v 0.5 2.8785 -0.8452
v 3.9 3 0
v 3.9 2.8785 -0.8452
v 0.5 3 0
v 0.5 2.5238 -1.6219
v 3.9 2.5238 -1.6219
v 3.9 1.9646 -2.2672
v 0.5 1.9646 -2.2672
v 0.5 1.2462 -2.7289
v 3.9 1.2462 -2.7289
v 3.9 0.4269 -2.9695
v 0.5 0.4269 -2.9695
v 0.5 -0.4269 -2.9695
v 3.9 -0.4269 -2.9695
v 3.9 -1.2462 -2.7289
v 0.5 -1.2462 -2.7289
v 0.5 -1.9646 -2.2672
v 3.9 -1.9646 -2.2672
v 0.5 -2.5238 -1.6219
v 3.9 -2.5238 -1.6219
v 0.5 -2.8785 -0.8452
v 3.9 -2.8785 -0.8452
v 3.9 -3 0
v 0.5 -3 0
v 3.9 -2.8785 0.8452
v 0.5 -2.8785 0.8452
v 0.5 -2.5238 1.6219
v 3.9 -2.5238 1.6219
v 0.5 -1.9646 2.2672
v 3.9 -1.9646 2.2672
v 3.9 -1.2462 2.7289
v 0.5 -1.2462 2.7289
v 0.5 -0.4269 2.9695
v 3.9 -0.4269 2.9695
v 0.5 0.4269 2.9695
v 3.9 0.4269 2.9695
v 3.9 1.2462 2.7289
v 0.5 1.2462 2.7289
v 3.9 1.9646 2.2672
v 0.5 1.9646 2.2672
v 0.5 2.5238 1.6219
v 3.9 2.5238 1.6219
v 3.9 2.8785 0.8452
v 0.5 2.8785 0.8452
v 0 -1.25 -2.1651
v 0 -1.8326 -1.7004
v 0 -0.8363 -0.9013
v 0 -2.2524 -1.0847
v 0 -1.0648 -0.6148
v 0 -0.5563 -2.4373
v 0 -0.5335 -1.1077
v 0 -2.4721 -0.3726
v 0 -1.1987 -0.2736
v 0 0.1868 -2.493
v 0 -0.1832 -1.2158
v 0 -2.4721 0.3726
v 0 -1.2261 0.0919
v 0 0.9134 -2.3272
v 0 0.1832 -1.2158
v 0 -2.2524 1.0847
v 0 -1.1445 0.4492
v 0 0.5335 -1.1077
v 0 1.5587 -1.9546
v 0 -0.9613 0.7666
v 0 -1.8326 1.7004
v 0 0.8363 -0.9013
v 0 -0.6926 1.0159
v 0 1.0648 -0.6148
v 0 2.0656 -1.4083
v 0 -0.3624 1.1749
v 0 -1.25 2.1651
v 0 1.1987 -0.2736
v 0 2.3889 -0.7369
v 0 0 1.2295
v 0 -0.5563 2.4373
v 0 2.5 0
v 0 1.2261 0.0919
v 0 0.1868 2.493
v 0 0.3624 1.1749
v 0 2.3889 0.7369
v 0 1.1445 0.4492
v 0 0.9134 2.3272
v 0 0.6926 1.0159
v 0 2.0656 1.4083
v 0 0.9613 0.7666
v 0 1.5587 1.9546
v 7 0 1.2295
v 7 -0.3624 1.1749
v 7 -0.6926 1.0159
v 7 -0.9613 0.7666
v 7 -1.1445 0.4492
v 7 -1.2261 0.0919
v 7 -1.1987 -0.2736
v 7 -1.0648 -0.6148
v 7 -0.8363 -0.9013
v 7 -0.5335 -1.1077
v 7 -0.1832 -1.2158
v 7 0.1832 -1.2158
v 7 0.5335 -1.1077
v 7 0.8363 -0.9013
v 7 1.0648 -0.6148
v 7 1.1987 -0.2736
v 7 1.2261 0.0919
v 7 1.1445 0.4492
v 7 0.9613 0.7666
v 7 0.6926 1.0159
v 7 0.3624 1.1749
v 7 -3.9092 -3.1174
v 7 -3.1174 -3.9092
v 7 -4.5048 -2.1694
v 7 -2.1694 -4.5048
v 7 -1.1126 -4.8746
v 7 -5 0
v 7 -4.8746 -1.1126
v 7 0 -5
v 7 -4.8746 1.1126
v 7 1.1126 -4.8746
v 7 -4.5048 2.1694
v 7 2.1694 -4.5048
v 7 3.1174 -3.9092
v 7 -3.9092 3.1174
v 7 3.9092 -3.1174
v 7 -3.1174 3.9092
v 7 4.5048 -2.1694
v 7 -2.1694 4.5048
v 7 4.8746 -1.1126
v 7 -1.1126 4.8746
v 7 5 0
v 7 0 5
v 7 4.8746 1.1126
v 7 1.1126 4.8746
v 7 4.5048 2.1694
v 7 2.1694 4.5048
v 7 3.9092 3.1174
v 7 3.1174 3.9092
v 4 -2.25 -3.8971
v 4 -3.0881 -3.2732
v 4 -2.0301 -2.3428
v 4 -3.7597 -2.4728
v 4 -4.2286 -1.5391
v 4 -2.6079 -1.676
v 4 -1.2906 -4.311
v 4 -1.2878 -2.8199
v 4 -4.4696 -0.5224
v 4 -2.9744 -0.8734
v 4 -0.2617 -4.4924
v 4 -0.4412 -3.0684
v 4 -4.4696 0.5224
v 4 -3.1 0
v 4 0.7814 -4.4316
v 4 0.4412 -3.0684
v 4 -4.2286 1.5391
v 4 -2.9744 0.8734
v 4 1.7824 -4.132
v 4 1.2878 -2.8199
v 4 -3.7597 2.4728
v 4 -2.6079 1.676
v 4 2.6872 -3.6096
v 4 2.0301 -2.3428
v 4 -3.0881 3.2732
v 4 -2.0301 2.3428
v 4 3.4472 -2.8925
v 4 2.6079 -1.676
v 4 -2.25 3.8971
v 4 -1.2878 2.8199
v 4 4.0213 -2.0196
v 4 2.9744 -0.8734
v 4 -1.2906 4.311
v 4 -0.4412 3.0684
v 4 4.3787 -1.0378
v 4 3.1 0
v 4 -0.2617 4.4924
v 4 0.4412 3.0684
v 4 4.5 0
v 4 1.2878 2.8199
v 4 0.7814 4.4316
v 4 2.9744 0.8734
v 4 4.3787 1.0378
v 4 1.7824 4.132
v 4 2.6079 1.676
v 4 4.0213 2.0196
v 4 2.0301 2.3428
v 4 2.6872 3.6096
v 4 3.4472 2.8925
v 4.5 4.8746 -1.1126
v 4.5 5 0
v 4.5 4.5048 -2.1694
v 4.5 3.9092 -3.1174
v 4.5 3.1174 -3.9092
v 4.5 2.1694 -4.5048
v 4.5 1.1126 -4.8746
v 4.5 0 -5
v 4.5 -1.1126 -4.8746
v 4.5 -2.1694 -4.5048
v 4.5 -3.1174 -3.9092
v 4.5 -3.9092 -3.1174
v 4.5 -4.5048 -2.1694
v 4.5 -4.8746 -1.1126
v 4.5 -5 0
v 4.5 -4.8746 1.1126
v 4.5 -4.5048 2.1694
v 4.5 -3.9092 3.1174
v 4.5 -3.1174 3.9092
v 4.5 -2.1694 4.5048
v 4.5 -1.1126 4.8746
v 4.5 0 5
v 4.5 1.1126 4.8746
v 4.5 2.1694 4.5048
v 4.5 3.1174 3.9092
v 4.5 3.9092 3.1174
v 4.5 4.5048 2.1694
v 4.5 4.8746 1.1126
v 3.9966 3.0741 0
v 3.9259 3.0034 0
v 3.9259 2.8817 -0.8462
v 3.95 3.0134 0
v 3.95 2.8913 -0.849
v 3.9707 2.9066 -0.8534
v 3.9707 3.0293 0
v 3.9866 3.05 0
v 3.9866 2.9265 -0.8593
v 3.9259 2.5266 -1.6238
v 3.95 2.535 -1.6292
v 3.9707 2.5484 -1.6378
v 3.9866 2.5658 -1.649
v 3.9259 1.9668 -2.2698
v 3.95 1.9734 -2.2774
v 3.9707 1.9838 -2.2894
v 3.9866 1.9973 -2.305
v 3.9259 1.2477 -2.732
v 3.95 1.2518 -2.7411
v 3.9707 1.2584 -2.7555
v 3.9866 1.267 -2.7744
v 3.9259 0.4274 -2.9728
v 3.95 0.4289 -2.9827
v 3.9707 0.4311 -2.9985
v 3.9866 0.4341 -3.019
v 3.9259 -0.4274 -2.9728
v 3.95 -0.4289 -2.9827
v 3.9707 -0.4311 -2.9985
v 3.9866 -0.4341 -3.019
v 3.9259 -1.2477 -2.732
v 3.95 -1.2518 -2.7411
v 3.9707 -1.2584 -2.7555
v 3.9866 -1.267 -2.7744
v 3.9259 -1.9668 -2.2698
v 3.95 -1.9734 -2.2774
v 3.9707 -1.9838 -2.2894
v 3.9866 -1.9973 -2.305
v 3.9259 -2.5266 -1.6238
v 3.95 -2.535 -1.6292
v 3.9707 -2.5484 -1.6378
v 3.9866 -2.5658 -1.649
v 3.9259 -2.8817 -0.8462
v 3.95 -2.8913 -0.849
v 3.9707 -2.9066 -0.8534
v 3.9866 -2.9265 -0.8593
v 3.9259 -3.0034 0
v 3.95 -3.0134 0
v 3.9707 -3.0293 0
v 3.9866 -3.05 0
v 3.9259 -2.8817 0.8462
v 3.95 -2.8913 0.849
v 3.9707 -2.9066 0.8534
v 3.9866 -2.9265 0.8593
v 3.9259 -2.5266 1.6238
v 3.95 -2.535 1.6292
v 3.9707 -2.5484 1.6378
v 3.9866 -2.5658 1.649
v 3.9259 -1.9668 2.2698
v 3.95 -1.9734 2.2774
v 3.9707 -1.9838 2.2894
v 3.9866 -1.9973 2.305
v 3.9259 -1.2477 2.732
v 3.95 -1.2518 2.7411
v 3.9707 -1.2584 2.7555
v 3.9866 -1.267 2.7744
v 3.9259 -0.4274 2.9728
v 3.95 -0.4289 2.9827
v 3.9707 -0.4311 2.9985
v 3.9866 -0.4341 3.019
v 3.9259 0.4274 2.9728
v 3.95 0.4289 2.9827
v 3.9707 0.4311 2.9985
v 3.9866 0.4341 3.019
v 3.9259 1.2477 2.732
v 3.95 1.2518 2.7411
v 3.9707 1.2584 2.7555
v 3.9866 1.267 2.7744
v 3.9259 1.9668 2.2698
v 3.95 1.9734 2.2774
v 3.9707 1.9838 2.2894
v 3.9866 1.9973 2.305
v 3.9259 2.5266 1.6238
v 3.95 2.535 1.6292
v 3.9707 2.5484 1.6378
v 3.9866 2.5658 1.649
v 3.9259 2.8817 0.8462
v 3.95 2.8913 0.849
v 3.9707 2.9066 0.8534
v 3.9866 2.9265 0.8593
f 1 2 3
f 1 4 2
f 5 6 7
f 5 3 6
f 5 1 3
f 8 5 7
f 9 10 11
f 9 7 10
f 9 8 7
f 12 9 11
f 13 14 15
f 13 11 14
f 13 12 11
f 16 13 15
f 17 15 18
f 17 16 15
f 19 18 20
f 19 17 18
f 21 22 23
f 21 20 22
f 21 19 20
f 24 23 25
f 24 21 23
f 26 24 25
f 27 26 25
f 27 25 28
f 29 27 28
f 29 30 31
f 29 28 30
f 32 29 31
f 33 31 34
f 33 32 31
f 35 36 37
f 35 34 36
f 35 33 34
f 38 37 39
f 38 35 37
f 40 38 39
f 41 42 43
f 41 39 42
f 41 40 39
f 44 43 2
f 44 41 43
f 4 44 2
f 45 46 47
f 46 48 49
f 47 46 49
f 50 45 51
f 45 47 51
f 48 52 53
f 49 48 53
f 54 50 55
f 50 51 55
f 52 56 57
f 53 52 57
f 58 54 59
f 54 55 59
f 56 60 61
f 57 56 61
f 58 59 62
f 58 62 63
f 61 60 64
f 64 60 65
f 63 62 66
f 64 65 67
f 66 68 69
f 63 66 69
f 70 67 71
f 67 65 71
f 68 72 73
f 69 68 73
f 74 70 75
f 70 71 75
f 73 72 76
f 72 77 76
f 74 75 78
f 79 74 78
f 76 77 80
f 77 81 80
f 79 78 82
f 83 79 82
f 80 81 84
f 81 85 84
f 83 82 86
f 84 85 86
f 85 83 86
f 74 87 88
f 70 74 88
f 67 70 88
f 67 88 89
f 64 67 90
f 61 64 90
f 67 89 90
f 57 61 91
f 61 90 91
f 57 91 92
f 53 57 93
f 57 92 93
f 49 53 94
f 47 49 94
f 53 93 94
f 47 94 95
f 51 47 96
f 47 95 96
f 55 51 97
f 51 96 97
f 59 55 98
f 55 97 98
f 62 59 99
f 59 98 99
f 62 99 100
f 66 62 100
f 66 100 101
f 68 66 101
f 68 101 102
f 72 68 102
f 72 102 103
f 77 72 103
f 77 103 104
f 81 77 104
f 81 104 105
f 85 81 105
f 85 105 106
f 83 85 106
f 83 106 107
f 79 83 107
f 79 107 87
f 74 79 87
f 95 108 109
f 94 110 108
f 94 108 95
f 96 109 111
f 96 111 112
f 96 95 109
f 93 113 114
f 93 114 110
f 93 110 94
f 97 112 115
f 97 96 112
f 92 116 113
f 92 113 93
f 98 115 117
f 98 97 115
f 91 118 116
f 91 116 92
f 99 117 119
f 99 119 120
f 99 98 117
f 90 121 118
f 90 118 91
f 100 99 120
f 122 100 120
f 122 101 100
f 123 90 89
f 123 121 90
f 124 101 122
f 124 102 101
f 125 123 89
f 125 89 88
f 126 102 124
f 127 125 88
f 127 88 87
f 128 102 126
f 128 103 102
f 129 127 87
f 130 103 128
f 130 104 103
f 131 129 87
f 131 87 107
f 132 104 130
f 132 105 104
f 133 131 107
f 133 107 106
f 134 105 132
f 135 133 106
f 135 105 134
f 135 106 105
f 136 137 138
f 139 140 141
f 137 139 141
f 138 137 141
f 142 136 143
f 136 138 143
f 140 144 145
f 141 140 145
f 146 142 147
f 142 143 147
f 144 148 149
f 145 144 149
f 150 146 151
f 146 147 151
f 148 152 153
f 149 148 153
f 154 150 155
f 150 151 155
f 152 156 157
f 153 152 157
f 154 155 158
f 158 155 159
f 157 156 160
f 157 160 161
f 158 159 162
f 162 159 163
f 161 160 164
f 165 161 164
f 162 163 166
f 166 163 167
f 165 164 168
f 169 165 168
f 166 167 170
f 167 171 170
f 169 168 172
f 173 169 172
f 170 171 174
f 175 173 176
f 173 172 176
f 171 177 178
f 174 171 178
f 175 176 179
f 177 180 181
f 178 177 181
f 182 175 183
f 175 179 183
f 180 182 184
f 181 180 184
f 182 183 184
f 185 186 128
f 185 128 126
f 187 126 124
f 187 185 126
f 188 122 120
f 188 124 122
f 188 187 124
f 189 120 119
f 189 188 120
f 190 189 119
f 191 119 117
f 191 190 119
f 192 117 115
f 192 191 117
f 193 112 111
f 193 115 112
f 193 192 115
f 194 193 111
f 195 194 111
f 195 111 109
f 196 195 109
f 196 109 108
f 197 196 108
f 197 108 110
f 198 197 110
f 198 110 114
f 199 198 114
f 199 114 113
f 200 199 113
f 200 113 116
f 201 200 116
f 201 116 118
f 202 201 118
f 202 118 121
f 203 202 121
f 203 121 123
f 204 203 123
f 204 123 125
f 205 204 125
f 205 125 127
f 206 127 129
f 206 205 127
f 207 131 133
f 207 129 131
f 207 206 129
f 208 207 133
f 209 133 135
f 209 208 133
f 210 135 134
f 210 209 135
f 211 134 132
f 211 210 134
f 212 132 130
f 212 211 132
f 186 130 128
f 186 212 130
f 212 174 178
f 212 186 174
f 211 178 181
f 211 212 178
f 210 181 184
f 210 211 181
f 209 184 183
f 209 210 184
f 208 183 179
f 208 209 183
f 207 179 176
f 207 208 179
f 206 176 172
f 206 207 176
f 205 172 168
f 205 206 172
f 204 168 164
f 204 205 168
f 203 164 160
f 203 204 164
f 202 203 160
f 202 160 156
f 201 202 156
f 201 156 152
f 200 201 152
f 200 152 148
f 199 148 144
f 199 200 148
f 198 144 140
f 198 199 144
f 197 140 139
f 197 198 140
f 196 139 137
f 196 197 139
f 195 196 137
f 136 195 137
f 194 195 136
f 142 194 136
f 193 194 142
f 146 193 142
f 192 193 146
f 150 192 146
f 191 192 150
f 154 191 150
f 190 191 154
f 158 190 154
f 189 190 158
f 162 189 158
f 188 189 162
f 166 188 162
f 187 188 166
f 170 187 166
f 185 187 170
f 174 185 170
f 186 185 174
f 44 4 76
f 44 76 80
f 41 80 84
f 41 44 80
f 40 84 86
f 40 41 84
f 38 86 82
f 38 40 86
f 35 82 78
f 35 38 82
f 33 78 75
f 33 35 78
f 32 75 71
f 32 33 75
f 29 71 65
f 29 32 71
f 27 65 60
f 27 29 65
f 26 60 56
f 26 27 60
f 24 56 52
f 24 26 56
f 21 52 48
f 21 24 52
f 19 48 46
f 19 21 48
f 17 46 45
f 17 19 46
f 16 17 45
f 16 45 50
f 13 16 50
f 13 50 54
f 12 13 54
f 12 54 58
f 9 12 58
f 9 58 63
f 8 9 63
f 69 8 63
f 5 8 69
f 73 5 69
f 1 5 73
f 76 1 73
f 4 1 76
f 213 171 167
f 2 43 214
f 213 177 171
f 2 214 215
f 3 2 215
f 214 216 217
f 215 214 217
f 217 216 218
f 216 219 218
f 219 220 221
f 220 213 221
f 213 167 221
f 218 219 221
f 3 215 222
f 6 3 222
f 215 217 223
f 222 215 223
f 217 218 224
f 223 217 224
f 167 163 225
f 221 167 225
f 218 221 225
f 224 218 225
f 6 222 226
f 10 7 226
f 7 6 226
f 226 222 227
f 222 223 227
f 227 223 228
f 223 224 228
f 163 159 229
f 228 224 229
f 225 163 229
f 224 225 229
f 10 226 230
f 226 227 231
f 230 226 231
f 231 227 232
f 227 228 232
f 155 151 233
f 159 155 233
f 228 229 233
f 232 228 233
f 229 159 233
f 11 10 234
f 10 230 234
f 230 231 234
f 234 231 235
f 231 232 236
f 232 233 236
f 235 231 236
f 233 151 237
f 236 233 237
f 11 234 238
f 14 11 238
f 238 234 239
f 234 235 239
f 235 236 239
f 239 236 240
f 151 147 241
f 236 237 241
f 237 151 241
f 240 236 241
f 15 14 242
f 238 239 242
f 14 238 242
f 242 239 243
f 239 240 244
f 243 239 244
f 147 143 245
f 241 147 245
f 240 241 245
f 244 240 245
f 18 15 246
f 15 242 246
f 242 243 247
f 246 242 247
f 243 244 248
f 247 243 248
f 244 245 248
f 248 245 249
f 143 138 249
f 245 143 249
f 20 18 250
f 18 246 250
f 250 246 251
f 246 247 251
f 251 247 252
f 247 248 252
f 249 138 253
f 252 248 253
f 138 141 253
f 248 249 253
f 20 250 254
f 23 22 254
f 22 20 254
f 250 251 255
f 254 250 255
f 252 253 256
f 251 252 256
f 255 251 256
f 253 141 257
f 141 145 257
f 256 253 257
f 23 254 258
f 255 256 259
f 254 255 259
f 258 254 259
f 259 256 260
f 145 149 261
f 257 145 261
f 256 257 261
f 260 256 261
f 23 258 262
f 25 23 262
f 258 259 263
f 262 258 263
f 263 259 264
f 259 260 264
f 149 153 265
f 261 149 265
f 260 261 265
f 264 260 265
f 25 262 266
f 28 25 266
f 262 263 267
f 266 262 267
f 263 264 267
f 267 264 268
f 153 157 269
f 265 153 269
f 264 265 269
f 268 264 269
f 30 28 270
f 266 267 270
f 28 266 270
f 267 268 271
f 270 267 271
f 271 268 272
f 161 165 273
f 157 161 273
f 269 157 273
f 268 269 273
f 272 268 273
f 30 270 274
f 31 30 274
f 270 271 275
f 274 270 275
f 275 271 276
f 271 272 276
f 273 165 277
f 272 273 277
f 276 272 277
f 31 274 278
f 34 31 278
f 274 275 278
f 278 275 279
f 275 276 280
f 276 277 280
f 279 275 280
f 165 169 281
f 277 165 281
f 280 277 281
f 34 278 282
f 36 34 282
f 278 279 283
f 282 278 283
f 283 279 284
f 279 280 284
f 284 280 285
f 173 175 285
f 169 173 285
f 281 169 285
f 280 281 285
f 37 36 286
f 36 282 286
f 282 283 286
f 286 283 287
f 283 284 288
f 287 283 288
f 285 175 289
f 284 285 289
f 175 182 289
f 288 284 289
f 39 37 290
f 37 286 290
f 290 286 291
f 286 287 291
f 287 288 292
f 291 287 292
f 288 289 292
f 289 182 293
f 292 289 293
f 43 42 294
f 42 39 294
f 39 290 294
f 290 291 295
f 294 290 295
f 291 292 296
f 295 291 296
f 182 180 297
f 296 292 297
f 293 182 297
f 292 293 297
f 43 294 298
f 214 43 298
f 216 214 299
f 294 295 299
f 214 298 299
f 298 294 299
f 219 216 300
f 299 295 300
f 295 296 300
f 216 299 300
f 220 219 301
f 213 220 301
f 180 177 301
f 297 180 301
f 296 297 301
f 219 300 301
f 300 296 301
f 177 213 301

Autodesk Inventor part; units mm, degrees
ref_plane "YZ Plane" through (0, 0, 0) normal (1, 0, 0) x (0, 1, 0)
ref_plane "XZ Plane" through (0, 0, 0) normal (0, 1, 0) x (-1, 0, 0)
ref_plane "XY Plane" through (0, 0, 0) normal (0, 0, 1) x (1, 0, 0)
sketch "Sketch1" plane through (0, 0, 0) normal (0, 0, 1) x (1, 0, 0)
  line L0 (0, 0) -> (4, 0)
  line L1 (4, 0) -> (4, 3)
  line L2 (4, 3) -> (0, 3)
  line L3 (0, 3) -> (0, 0)
  line L4 (4, 0) -> (7, 0)
  line L5 (7, 0) -> (7, 5)
  line L6 (7, 5) -> (4, 5)
  line L7 (4, 5) -> (4, 0)
  dimension "d0" = 4
  dimension "d1" = 3
  dimension "d2" = 3
  dimension "d3" = 5
revolve "Revolution1" add sketch "Sketch1" angle 360 about axis through (0, 0, 0) along (1, 0, 0)
fillet "Fillet1" radius 0.1 1 edges at (4, -3, 0)
chamfer "Chamfer1" distance 0.5 angle 45 2 edges at (4, -5, 0) (0, -3, 0)
sketch "Sketch2" plane through (0, 0, 0) normal (-1, 0, 0) x (0, 0, 1)
  point P0 (0, 0)
  point P1 (0, 0)
hole "Hole1" at (0, 0, 0) direction (1, 0, 0) diameter 2.459 end through all thread size "M3x0.5" class "6H" standard "ANSI Metric M Profile"
properties part number "Top_Shaft 1" material "Stainless Steel"
